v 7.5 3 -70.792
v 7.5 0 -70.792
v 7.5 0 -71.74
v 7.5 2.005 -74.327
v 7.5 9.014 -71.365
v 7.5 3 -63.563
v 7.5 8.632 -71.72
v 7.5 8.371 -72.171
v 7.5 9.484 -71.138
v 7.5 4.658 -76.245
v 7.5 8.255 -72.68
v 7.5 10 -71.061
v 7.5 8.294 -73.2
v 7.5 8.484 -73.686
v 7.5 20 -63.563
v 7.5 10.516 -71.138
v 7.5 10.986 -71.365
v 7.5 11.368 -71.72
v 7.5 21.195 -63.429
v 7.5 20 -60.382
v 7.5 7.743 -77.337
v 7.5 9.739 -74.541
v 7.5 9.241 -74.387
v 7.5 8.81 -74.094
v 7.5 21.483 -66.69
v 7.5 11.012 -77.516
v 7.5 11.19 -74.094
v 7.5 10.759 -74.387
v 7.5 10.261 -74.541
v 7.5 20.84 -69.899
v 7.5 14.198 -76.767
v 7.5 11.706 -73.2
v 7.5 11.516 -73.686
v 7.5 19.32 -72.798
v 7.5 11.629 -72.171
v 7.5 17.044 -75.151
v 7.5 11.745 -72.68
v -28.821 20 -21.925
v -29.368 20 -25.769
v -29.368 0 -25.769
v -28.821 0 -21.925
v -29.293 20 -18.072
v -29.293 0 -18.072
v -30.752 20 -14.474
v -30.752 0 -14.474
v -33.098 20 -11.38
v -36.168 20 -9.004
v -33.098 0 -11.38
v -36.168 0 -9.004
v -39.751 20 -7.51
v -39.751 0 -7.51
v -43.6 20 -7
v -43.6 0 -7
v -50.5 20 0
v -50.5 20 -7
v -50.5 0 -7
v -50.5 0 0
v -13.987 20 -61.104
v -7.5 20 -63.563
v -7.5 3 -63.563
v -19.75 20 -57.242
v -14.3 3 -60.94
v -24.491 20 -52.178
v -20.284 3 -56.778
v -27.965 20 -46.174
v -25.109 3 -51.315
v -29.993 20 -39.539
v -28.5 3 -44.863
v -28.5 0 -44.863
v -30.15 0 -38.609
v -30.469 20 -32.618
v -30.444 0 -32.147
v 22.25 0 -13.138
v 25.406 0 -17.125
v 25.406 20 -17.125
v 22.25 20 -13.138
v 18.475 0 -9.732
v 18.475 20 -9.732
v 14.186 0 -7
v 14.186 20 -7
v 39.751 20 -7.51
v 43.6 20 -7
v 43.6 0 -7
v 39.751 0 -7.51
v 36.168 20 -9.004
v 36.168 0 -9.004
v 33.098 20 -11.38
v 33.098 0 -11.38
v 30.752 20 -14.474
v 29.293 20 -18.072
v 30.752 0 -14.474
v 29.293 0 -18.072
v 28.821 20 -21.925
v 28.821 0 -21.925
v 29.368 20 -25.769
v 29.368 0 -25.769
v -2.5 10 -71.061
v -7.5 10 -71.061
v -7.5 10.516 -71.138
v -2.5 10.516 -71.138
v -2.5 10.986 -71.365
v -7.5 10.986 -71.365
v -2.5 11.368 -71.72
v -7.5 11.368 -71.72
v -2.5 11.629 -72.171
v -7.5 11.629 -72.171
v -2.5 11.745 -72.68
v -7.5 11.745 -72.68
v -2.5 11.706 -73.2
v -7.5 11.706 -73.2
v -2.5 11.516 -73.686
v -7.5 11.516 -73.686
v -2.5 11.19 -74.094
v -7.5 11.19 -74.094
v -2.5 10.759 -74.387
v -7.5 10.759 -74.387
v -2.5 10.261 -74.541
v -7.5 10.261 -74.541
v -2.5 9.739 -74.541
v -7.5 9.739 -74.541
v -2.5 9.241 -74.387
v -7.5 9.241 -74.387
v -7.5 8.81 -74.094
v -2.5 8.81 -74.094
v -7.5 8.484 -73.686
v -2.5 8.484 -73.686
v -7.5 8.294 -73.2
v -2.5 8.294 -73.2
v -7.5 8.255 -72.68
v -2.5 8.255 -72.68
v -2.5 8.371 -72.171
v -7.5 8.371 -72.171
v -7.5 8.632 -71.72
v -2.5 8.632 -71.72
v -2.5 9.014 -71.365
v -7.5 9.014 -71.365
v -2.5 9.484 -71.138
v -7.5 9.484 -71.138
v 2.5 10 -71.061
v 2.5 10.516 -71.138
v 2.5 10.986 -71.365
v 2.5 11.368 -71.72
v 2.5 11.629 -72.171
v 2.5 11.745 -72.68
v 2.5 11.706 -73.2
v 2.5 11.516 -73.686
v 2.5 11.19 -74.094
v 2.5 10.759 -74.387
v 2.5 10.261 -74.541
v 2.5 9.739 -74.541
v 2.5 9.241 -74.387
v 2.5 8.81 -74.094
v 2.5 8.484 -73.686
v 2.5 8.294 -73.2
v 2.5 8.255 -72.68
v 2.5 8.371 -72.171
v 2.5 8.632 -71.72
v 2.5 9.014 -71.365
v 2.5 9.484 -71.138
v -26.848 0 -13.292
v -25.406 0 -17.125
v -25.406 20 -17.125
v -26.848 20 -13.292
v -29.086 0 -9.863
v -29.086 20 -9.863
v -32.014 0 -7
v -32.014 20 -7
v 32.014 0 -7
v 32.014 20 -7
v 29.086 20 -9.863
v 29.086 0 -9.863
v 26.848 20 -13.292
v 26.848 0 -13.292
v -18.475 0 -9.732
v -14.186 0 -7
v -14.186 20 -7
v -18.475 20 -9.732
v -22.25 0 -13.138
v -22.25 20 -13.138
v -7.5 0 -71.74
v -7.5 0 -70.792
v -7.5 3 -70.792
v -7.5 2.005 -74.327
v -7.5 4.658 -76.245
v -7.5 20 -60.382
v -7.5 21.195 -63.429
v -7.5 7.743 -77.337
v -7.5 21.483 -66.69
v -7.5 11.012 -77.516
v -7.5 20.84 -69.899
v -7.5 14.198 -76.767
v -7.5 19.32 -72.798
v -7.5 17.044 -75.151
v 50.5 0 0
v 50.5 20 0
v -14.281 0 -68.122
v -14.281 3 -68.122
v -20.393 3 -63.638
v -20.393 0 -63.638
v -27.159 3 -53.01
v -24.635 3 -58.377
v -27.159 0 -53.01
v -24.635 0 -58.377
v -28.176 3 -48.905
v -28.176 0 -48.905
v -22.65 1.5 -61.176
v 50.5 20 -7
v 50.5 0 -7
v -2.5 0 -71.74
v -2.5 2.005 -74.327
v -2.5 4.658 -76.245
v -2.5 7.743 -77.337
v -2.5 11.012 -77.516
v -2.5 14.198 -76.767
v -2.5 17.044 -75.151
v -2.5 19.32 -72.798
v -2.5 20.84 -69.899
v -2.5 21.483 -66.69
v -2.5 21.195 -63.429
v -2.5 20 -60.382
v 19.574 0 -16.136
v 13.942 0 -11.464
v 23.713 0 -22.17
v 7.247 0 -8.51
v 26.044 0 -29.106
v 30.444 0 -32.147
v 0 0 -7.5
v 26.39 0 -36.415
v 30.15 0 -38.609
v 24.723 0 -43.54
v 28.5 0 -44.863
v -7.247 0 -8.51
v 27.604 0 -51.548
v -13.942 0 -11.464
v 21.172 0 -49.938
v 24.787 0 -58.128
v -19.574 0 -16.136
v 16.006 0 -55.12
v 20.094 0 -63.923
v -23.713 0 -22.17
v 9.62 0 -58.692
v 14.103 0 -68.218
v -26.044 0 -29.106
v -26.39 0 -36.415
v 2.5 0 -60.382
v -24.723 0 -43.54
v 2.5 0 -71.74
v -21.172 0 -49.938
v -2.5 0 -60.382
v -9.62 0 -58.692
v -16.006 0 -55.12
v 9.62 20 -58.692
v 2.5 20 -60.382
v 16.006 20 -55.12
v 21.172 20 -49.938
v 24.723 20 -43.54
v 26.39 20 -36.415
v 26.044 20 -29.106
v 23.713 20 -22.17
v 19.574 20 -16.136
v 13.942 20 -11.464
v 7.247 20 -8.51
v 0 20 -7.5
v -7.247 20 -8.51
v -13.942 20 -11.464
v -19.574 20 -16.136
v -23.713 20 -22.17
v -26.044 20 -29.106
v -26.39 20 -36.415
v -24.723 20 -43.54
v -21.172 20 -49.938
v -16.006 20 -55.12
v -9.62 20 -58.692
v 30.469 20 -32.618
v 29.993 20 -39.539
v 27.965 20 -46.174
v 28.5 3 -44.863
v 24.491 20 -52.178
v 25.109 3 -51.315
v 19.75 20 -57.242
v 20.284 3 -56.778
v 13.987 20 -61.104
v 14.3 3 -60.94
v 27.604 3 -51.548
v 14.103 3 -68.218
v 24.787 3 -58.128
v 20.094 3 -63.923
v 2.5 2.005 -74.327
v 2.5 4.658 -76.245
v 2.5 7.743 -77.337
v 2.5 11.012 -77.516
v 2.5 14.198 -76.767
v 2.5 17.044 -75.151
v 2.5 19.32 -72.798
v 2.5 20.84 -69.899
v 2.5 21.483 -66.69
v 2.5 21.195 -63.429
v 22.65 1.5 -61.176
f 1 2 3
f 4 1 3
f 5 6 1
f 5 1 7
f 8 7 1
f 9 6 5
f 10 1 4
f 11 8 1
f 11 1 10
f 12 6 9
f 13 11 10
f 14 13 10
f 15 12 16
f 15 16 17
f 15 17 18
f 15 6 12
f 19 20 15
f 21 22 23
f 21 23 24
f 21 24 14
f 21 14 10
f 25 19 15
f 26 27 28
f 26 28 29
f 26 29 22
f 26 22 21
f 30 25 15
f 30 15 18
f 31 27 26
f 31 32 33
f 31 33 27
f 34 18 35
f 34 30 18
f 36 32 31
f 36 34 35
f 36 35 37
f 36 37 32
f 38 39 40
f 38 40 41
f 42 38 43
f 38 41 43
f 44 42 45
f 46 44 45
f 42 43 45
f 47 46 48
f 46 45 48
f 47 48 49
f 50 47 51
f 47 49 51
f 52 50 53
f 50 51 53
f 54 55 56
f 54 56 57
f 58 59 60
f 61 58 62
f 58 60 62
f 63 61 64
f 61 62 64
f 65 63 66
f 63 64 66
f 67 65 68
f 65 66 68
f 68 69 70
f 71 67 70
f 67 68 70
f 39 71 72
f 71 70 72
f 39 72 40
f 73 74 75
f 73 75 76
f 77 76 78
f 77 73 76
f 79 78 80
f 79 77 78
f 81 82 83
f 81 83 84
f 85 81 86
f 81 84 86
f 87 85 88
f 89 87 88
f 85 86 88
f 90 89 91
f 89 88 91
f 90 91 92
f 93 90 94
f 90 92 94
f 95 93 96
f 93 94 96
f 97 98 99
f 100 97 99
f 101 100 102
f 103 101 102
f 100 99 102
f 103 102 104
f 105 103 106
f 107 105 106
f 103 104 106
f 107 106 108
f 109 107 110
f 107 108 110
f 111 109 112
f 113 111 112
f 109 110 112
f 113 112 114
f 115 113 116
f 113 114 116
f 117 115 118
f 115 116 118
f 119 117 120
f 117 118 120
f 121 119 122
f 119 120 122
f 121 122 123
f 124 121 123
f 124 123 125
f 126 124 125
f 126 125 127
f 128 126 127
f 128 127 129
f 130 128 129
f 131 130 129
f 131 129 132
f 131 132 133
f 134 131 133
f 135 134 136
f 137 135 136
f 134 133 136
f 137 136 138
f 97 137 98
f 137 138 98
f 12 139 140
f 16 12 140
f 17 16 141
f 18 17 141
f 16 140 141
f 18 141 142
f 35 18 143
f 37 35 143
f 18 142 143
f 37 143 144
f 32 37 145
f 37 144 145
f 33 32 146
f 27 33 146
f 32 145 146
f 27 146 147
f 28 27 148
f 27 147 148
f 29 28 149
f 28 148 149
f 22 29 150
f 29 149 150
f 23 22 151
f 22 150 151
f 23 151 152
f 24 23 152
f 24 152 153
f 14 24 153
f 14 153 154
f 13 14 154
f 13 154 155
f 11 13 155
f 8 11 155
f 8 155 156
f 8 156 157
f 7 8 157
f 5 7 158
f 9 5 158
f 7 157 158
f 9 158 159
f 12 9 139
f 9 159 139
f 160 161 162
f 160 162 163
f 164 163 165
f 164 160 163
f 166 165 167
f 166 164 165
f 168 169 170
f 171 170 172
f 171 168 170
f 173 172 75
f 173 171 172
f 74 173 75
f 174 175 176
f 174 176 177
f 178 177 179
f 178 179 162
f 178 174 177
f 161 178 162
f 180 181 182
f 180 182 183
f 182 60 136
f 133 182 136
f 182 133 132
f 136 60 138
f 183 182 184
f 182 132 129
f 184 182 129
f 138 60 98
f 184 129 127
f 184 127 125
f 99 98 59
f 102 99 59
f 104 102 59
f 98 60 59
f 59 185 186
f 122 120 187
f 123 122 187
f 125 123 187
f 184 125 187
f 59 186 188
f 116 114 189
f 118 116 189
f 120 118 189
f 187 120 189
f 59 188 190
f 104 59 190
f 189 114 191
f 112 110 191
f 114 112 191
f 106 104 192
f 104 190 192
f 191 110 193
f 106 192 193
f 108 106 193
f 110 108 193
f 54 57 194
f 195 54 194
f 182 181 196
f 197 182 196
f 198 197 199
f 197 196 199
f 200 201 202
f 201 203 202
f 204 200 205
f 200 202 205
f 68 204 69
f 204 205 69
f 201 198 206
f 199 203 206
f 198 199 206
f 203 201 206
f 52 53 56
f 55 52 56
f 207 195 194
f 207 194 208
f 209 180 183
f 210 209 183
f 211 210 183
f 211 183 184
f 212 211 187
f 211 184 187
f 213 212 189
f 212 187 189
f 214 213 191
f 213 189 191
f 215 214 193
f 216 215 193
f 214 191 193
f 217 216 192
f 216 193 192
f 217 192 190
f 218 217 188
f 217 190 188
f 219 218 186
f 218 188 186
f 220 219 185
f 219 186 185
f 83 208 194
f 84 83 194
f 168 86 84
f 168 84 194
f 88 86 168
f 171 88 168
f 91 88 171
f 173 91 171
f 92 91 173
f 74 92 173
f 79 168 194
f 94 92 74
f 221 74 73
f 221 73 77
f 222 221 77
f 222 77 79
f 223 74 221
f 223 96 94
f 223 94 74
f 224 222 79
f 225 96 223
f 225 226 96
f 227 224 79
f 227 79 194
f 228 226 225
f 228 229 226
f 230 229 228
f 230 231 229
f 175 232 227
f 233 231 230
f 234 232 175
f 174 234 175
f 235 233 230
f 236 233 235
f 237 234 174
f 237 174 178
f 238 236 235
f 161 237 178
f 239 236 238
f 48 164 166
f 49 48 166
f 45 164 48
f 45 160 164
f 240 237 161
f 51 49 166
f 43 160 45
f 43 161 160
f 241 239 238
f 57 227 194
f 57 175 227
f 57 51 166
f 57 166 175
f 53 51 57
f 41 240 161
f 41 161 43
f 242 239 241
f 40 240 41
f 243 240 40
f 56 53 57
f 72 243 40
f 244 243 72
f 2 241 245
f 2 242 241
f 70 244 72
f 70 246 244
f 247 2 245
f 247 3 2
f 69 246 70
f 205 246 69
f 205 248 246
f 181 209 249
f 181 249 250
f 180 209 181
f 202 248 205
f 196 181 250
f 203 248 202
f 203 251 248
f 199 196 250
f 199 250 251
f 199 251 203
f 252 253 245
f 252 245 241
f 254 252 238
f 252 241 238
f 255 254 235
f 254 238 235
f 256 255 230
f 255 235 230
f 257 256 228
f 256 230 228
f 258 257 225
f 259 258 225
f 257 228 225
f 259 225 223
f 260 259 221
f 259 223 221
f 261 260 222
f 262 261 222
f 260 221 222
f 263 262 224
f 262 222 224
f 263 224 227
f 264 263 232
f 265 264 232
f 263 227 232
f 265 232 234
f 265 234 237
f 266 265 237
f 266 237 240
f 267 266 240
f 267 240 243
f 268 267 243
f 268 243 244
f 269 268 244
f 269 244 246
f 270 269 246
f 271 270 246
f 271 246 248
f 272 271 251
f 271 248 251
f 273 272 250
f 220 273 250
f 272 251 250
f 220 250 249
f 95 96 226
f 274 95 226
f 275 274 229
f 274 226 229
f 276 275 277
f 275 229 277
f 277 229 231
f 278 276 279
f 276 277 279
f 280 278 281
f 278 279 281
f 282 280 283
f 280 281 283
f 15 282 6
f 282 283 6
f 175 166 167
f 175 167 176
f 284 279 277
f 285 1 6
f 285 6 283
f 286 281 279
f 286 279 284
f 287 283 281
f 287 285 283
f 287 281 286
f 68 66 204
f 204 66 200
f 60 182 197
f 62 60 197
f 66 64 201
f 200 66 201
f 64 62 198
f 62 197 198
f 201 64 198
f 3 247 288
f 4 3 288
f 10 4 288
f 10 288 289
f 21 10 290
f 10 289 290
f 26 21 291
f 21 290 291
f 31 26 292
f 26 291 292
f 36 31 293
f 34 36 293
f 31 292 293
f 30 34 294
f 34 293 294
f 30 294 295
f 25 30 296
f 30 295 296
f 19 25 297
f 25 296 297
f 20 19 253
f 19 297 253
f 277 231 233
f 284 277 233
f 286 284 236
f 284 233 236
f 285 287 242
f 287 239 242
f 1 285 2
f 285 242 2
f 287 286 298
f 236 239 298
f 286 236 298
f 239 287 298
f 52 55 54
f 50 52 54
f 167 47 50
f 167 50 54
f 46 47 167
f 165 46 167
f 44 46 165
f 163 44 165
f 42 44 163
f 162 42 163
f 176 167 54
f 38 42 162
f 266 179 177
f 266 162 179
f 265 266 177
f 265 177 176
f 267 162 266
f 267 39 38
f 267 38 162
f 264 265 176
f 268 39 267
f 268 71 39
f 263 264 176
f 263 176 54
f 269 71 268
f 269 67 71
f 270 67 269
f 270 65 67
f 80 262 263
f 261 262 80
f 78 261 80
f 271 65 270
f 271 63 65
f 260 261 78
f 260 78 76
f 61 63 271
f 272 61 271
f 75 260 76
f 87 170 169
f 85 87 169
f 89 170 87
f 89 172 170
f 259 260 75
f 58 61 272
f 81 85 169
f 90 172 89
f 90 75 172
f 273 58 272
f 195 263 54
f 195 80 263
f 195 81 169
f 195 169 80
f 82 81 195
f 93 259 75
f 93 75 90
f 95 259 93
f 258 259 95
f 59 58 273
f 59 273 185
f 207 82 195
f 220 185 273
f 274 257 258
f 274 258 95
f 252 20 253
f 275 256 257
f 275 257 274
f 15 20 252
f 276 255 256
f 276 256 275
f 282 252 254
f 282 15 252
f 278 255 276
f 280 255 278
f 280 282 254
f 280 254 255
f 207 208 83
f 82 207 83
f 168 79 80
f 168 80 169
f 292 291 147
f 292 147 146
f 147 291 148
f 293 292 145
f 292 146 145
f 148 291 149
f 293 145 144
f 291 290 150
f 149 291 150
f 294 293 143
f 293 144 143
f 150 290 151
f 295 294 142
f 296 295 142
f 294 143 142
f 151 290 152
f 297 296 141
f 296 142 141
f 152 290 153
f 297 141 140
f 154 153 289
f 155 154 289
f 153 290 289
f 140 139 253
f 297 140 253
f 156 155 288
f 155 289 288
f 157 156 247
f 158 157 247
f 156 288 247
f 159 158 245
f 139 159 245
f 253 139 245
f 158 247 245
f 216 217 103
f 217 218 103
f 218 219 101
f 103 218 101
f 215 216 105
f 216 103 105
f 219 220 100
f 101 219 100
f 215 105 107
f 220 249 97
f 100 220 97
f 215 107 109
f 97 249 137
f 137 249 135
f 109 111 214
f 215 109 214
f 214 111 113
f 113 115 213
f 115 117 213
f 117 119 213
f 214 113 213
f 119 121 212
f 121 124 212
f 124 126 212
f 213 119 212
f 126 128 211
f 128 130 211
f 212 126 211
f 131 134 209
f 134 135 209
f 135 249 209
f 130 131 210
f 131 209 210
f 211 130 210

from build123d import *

# Parameters (mm, degrees)
SALIENTE_EXTRUIR1_DEPTH = 20
CROQUIS2_R              = 1.75
SALIENTE_EXTRUIR2_DEPTH = 5
MATRIZL1_COUNT          = 2
MATRIZL1_PITCH          = 10
SALIENTE_EXTRUIR3_DEPTH = 3


with BuildPart() as part:
    # Croquis1 → Saliente-Extruir1 (new body)
    with BuildSketch(Plane(origin=(0, 0, 0), x_dir=(1, 0, 0), z_dir=(0, 1, 0))):
        with BuildLine():
            Line((-50.5, 0), (50.5, 0))
            Line((50.5, 0), (50.5, 7))
            Line((50.5, 7), (43.6, 7))
            ThreePointArc((43.6, 7), (31.822793565, 12.849892164), (29.368318159, 25.768846465))
            ThreePointArc((29.368318159, 25.768846465), (25.038732007, 51.41585196), (2.5, 64.397368307))
            Line((2.5, 64.397368307), (2.5, 60.381811917))
            ThreePointArc((2.5, 60.381811917), (0, 7.5), (-2.5, 60.381811917))
            Line((-2.5, 60.381811917), (-2.5, 64.397368307))
            ThreePointArc((-2.5, 64.397368307), (-25.038732007, 51.41585196), (-29.368318159, 25.768846465))
            ThreePointArc((-29.368318159, 25.768846465), (-31.822793565, 12.849892164), (-43.6, 7))
            Line((-43.6, 7), (-50.5, 7))
            Line((-50.5, 7), (-50.5, 0))
        make_face()
        with BuildLine():
            Line((14.186260959, 7), (32.013771293, 7))
            ThreePointArc((32.013771293, 7), (27.872929965, 11.516026639), (25.406103057, 17.124576229))
            ThreePointArc((25.406103057, 17.124576229), (20.433198062, 11.356360342), (14.186260959, 7))
        make_face(mode=Mode.SUBTRACT)
        with BuildLine():
            Line((-32.013771293, 7), (-14.186260959, 7))
            ThreePointArc((-14.186260959, 7), (-20.433198062, 11.356360342), (-25.406103057, 17.124576229))
            ThreePointArc((-25.406103057, 17.124576229), (-27.872929965, 11.516026639), (-32.013771293, 7))
        make_face(mode=Mode.SUBTRACT)
    extrude(amount=SALIENTE_EXTRUIR1_DEPTH)

    # Croquis2 → Saliente-Extruir2 (add)
    with BuildSketch(Plane.ZY.offset(-2.5)):
        with BuildLine():
            Line((-60.381811917, 20), (-60.381811917, 0))
            Line((-60.381811917, 0), (-71.739628608, 0))
            ThreePointArc((-71.739628608, 0), (-76.060720262, 15.678908346), (-60.381811917, 20))
        make_face()
        with Locations((-72.810720262, 10)):
            Circle(CROQUIS2_R, mode=Mode.SUBTRACT)
    saliente_extruir2 = extrude(amount=-SALIENTE_EXTRUIR2_DEPTH)

    # MatrizL1: Saliente-Extruir2 ×2
    with Locations(*[(-i * MATRIZL1_PITCH, 0, 0) for i in range(1, MATRIZL1_COUNT)]):
        add(saliente_extruir2)

    # Croquis3 → Saliente-Extruir3 (add)
    with BuildSketch(Plane(origin=(0, 0, 0), x_dir=(1, 0, 0), z_dir=(0, 1, 0))):
        with BuildLine():
            Line((-7.5, 70.792294373), (-7.5, 63.563490998))
            ThreePointArc((-7.5, 63.563490998), (-20.283716212, 56.7776394), (-28.5, 44.862780491))
            add(Edge.make_bspline(
                [(-7.5, 70.792294373), (-28.5, 65.390312314), (-28.5, 44.862780491)],
                knots=[4.978682998, 4.978682998, 4.978682998, 6.283185307, 6.283185307, 6.283185307], degree=2, weights=[1, 0.794719414, 1]))
        make_face()
        with BuildLine():
            Line((7.5, 70.792294373), (7.5, 63.563490998))
            ThreePointArc((7.5, 63.563490998), (20.283716212, 56.7776394), (28.5, 44.862780491))
            add(Edge.make_bspline(
                [(28.5, 44.862780491), (28.5, 65.390312314), (7.5, 70.792294373)],
                knots=[3.141592654, 3.141592654, 3.141592654, 4.446094963, 4.446094963, 4.446094963], degree=2, weights=[1, 0.794719414, 1]))
        make_face()
    extrude(amount=SALIENTE_EXTRUIR3_DEPTH)


solid = part.part
